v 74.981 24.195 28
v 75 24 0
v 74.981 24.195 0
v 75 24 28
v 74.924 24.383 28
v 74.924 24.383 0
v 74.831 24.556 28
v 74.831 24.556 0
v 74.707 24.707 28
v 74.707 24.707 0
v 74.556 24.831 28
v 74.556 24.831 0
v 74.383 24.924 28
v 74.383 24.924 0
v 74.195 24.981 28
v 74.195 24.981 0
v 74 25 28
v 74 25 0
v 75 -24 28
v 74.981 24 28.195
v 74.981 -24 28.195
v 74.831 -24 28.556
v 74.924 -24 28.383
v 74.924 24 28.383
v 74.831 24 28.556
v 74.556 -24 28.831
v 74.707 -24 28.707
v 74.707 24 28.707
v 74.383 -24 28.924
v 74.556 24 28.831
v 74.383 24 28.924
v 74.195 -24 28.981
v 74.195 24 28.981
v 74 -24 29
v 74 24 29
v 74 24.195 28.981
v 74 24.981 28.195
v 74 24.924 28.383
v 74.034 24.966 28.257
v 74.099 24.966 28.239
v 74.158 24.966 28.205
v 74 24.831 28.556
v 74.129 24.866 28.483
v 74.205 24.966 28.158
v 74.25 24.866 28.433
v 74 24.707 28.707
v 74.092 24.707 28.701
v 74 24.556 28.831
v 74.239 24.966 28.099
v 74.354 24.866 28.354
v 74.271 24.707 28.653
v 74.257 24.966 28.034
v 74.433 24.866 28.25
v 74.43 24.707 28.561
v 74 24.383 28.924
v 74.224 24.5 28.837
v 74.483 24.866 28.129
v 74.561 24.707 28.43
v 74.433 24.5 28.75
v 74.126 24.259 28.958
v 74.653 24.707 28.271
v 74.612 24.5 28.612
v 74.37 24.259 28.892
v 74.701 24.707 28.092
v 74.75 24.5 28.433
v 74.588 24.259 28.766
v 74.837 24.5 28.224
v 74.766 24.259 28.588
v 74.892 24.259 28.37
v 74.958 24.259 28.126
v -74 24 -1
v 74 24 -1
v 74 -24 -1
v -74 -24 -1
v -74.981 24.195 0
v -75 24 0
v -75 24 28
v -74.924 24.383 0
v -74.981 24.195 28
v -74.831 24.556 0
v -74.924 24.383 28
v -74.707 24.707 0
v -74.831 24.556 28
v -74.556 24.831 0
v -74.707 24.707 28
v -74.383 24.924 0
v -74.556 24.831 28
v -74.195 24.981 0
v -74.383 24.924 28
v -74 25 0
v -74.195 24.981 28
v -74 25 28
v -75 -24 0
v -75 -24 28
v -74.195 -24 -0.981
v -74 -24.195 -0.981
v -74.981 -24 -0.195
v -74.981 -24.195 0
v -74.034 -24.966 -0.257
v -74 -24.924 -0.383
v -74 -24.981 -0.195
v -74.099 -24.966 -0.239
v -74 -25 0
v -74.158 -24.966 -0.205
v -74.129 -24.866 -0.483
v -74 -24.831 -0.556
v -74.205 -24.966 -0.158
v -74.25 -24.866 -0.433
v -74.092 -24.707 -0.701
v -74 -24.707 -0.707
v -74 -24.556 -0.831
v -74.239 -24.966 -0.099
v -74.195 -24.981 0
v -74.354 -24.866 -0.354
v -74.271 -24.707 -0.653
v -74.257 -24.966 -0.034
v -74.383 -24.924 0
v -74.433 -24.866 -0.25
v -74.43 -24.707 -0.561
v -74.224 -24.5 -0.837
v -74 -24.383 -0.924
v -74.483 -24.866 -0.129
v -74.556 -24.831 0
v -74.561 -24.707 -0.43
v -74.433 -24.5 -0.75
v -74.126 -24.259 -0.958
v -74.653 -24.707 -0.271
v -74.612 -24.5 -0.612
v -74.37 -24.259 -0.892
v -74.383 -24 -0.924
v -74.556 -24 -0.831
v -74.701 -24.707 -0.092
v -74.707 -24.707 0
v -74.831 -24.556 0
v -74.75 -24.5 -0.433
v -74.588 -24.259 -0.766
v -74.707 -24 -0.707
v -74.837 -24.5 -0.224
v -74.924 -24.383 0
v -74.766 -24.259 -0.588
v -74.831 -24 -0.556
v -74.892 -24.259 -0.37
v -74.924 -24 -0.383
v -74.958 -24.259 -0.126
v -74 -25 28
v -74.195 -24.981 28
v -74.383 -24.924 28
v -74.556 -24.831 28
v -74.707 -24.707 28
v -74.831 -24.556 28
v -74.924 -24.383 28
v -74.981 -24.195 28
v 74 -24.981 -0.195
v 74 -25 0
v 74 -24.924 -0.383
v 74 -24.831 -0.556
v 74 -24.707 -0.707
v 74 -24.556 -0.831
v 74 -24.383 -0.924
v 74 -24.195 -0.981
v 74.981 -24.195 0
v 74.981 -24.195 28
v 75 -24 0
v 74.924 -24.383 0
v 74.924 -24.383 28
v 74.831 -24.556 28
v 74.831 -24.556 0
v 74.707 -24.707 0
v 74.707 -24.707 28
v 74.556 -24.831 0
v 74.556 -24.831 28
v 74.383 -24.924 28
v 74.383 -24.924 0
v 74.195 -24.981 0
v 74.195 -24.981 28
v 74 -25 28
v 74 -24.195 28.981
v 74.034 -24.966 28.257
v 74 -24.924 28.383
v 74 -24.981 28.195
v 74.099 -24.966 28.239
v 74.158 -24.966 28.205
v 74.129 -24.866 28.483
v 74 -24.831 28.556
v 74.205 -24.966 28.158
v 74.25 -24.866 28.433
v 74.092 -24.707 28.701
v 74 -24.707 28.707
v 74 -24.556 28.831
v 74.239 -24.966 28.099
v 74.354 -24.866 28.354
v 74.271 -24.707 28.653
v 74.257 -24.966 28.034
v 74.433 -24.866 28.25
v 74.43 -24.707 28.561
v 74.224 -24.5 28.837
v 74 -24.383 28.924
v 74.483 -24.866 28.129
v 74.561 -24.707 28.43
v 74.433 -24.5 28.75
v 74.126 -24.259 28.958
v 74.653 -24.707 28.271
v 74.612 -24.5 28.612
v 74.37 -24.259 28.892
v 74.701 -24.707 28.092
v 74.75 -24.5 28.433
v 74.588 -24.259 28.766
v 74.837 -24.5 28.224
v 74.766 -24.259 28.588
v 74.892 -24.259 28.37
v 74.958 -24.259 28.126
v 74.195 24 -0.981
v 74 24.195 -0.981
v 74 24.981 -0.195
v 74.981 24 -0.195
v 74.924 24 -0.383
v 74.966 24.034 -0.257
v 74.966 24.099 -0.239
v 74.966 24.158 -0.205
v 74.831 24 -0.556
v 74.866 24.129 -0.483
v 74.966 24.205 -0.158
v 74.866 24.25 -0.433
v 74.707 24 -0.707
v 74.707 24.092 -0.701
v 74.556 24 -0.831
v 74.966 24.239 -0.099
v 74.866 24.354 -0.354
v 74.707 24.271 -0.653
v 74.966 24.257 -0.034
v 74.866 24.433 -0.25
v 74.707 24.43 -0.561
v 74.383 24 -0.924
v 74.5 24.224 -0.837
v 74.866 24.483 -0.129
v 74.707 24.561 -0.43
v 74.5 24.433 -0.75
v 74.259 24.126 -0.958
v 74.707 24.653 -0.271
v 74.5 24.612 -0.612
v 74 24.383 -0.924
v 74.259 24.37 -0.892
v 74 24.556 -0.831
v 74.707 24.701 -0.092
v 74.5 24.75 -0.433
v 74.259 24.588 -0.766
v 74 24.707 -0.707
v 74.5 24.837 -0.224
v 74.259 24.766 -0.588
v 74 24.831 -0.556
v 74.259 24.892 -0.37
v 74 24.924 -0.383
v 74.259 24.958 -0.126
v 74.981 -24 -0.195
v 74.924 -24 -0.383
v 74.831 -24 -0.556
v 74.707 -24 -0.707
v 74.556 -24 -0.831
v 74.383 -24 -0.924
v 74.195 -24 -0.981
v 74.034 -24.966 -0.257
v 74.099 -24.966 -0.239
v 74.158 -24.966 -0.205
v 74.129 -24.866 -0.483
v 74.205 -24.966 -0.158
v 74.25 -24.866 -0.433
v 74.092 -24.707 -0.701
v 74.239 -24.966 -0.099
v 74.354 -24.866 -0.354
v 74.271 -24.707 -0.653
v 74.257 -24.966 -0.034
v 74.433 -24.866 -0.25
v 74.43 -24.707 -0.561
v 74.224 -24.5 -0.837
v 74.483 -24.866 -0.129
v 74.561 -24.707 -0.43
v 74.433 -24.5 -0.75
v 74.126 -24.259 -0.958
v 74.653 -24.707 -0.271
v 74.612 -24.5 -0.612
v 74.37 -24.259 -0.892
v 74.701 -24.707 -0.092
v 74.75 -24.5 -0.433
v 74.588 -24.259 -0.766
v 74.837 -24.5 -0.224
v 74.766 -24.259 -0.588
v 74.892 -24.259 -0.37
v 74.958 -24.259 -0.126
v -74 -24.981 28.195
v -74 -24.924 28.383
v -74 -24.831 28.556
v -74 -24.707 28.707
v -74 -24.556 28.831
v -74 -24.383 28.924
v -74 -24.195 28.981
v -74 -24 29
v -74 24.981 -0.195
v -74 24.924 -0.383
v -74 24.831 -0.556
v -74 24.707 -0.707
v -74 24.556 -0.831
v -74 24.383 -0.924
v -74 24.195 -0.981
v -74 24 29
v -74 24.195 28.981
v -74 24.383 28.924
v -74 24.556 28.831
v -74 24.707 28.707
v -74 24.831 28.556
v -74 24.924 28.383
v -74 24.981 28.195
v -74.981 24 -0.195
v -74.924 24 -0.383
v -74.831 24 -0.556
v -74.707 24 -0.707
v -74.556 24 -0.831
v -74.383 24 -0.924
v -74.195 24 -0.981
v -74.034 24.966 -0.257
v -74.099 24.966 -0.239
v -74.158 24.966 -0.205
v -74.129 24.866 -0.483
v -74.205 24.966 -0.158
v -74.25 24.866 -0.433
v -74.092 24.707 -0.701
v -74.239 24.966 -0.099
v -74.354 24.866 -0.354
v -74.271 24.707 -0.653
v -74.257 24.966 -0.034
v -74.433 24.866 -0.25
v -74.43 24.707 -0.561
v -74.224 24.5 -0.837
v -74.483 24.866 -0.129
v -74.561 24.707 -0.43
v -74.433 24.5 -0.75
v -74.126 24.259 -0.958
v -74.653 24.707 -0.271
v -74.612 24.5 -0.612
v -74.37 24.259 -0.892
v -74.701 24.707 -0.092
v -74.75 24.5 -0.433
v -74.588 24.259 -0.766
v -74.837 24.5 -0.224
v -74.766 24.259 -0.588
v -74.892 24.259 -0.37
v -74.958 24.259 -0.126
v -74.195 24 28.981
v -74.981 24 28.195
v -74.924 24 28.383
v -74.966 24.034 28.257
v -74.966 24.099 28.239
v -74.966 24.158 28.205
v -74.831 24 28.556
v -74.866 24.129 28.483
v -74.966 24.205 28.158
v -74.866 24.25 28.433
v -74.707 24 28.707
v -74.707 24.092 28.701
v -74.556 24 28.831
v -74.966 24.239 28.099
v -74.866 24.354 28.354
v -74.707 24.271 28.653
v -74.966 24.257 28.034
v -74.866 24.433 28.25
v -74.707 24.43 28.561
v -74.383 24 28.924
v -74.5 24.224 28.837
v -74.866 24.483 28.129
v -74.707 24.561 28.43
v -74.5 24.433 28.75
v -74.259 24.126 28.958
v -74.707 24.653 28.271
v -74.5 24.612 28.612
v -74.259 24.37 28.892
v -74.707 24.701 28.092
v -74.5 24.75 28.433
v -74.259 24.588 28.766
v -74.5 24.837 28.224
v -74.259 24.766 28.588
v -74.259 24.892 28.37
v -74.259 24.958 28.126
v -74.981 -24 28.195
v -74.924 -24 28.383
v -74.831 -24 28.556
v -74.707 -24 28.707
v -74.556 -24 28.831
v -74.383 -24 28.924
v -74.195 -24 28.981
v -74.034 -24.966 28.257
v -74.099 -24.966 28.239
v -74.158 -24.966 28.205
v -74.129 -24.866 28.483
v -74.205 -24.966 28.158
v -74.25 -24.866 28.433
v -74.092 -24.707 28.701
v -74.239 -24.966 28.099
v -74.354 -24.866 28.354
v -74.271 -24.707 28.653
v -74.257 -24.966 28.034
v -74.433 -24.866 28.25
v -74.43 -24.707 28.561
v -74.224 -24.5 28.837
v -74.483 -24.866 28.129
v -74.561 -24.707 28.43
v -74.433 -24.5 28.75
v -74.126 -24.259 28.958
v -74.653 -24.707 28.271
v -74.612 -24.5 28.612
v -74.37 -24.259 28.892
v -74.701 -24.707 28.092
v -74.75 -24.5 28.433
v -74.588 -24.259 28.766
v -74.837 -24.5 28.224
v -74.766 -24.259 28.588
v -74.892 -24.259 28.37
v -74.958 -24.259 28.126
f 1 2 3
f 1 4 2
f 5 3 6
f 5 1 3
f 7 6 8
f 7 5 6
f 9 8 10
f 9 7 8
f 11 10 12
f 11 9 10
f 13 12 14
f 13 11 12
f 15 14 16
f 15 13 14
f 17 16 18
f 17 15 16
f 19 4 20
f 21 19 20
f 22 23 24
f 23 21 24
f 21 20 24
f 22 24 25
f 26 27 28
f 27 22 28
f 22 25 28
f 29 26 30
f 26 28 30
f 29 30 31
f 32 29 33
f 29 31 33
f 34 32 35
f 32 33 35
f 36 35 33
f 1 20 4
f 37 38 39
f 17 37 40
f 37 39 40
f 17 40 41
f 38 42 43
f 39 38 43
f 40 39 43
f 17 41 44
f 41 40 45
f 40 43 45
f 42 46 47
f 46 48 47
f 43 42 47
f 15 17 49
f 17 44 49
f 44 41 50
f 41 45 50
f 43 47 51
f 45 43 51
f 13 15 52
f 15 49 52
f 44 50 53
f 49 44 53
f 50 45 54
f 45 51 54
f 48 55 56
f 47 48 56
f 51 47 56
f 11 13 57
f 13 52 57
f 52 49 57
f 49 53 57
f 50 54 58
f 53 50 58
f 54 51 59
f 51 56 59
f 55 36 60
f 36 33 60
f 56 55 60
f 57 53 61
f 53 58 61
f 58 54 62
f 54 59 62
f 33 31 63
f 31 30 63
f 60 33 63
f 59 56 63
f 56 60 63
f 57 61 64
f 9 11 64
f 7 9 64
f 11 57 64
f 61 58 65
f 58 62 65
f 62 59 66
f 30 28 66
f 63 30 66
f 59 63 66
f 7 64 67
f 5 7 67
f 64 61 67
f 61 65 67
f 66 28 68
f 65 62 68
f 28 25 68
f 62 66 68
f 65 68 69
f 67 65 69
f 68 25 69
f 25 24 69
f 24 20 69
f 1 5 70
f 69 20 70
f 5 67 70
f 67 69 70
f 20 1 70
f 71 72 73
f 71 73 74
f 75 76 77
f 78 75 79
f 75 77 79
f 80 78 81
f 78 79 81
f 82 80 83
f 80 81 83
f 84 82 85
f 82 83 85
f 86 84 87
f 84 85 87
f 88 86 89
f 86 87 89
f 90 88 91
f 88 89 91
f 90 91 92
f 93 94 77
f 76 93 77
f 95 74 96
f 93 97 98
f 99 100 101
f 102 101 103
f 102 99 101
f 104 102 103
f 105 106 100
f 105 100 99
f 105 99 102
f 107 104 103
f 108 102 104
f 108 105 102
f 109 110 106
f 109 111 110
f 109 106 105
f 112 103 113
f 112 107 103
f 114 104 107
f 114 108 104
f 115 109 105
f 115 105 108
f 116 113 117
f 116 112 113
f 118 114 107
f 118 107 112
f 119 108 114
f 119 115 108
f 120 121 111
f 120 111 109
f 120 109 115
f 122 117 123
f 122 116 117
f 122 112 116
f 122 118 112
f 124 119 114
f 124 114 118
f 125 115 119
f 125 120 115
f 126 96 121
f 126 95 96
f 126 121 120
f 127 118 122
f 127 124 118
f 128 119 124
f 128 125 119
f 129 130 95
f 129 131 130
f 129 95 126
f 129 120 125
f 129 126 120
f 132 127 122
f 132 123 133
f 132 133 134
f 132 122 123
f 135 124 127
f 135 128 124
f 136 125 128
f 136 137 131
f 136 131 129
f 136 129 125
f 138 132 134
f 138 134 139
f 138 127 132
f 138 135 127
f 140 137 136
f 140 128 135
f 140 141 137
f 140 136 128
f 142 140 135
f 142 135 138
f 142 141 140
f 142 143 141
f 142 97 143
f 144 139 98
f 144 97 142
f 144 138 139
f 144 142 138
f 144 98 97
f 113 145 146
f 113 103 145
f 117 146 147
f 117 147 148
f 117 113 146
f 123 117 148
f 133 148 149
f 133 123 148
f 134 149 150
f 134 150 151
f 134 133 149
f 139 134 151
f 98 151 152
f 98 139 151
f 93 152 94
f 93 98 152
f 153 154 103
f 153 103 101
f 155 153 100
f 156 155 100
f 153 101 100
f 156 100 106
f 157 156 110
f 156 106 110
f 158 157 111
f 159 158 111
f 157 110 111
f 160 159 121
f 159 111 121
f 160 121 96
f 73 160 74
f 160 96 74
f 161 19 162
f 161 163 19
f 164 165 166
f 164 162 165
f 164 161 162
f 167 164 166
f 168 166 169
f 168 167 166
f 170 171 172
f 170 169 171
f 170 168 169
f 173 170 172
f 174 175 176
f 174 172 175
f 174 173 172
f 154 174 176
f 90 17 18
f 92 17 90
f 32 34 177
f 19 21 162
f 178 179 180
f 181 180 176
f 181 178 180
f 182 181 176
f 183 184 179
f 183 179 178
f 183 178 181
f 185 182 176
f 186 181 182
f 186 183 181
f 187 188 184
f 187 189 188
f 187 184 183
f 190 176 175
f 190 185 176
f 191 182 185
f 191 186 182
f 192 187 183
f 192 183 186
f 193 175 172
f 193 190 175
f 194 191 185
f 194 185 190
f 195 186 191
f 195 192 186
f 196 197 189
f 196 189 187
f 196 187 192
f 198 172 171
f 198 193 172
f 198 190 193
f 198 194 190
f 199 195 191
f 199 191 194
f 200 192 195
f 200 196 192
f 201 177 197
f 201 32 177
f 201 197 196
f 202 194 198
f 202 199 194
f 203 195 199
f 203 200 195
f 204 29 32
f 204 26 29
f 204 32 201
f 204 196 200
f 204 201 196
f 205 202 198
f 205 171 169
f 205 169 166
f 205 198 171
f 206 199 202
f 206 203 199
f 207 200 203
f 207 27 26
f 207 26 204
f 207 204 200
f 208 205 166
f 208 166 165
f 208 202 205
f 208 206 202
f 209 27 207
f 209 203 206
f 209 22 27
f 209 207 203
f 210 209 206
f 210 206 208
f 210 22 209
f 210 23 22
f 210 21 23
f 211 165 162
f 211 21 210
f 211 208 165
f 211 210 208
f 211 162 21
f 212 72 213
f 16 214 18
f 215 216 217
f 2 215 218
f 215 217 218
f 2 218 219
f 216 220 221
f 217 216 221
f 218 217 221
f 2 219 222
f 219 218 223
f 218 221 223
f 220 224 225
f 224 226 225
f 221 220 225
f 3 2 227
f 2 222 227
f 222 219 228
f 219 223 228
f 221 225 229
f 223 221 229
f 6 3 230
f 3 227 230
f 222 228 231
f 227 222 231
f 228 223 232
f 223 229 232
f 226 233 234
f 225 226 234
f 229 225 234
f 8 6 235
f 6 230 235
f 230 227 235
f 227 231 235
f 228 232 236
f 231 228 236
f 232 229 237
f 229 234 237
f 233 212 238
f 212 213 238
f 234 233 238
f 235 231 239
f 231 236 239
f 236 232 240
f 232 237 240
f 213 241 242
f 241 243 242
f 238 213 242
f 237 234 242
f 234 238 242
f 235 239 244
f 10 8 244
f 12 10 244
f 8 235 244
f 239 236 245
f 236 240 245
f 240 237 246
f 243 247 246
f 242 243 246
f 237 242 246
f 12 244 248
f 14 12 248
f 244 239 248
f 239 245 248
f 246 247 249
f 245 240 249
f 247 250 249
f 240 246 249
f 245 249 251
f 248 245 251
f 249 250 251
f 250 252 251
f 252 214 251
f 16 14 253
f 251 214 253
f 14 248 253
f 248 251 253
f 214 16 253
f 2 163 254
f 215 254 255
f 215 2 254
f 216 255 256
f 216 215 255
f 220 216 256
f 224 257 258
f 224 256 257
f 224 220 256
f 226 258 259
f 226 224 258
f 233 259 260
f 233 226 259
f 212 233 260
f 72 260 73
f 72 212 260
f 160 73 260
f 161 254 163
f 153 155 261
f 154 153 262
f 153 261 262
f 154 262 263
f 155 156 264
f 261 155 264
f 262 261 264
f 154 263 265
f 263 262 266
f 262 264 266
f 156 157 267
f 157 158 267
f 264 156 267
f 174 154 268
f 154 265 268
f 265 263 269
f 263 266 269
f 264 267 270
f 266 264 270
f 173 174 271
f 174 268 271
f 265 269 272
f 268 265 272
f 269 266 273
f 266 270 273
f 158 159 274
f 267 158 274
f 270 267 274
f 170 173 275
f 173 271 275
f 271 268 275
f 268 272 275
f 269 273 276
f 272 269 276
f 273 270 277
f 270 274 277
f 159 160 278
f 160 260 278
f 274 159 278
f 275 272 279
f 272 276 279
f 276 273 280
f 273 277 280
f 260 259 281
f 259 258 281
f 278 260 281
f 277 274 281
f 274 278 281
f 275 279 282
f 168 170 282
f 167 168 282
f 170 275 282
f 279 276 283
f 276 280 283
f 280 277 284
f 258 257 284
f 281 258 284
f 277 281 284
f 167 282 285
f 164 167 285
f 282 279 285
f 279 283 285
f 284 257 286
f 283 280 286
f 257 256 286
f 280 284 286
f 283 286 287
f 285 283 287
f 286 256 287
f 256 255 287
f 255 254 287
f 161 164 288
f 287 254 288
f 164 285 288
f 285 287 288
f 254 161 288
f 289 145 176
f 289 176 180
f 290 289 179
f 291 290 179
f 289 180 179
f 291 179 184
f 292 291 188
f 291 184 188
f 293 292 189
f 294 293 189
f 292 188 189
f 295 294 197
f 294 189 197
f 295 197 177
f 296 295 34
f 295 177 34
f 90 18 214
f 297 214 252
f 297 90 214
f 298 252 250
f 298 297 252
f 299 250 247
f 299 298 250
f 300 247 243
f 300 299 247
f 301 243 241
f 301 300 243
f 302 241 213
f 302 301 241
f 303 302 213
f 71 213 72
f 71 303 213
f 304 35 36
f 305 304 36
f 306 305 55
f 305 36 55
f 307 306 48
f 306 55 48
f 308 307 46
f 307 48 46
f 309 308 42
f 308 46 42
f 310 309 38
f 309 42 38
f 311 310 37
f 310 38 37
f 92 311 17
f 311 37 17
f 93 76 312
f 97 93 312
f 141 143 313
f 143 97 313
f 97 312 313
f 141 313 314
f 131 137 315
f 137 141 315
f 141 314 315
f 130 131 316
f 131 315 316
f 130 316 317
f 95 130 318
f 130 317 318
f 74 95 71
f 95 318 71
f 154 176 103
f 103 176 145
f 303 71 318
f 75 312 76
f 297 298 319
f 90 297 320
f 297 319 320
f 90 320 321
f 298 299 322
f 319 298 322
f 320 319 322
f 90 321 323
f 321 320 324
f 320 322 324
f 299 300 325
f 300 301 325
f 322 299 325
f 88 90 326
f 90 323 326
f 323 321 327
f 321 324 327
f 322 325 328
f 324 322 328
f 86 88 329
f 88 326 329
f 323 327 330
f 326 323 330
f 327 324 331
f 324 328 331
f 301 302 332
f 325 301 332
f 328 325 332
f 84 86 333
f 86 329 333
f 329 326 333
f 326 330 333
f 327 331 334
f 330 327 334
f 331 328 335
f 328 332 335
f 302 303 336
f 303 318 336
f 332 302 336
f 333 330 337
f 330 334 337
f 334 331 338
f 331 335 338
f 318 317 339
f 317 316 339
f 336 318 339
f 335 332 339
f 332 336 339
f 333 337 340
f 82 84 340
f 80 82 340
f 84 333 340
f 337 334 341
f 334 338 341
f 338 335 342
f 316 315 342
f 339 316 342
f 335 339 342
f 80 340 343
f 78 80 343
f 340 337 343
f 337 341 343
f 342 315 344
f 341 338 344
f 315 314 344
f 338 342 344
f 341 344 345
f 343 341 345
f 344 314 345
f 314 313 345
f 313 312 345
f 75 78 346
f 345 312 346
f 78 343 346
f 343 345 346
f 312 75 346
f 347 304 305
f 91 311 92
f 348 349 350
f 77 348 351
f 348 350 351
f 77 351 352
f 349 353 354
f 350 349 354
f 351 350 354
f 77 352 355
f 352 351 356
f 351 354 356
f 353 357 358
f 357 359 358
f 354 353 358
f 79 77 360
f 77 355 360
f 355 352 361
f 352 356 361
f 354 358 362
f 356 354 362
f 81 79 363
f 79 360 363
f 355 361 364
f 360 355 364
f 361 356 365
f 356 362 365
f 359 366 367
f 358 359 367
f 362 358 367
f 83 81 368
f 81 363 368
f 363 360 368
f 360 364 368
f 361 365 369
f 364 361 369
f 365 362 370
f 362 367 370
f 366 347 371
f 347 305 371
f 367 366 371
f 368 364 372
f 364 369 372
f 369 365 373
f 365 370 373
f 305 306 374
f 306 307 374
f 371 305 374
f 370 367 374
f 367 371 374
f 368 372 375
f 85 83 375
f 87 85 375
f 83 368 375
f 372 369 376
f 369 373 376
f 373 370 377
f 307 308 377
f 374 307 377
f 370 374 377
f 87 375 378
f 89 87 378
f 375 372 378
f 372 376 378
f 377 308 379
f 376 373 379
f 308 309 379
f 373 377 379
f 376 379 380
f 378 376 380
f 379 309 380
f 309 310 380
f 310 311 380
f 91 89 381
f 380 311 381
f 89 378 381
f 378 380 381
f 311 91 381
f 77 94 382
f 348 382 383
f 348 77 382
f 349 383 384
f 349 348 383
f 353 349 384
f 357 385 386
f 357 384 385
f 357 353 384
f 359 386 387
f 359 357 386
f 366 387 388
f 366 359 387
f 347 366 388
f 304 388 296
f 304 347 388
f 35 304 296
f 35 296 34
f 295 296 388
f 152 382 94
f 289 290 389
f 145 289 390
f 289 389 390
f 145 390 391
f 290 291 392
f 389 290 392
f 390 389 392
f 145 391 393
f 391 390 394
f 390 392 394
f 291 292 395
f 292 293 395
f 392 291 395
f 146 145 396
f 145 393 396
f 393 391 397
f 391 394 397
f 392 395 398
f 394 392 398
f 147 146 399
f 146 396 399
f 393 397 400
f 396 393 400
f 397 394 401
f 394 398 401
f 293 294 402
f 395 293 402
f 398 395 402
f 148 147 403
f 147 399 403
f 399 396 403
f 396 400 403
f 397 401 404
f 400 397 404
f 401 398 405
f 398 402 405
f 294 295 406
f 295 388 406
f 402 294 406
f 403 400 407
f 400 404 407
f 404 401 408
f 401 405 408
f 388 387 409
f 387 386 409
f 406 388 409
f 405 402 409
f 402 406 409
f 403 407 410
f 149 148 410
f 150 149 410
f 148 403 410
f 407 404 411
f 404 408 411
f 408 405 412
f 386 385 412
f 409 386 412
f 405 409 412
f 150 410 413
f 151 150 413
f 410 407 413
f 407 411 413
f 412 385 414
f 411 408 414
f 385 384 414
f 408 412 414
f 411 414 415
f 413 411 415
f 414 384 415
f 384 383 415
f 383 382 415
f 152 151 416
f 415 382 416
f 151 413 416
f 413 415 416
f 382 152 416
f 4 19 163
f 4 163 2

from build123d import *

# Parameters (mm, degrees)
SKETCH1_W           = 150
SKETCH1_H           = 50
BOSS_EXTRUDE1_DEPTH = 28
SKETCH3_W           = 150
SKETCH3_H           = 50
BOSS_EXTRUDE2_DEPTH = 1
SKETCH4_W           = 150
SKETCH4_H           = 50
BOSS_EXTRUDE3_DEPTH = 1
FILLET1_R           = 1


with BuildPart() as part:
    # Sketch1 → Boss-Extrude1 (new body)
    with BuildSketch(Plane.XY):
        Rectangle(SKETCH1_W, SKETCH1_H)
    extrude(amount=BOSS_EXTRUDE1_DEPTH)

    # Sketch3 → Boss-Extrude2 (add)
    with BuildSketch(Plane.XY.offset(28)):
        Rectangle(SKETCH3_W, SKETCH3_H)
    extrude(amount=BOSS_EXTRUDE2_DEPTH)

    # Sketch4 → Boss-Extrude3 (add)
    with BuildSketch(Plane(origin=(0, 0, 0), x_dir=(-1, 0, 0), z_dir=(0, 0, -1))):
        Rectangle(SKETCH4_W, SKETCH4_H)
    extrude(amount=BOSS_EXTRUDE3_DEPTH)

    # Fillet1
    fillet1_edges = [part.edges().sort_by_distance(p)[0] for p in [
        (75, 0, 29),
        (0, 25, 29),
        (-75, 0, 29),
        (0, -25, 29),
        (-75, 0, -1),
        (0, 25, -1),
        (75, 0, -1),
        (0, -25, -1),
        (75, -25, 14),
        (-75, -25, 14),
        (-75, 25, 14),
        (75, 25, 14),
    ]]
    fillet(fillet1_edges, radius=FILLET1_R)


solid = part.part
